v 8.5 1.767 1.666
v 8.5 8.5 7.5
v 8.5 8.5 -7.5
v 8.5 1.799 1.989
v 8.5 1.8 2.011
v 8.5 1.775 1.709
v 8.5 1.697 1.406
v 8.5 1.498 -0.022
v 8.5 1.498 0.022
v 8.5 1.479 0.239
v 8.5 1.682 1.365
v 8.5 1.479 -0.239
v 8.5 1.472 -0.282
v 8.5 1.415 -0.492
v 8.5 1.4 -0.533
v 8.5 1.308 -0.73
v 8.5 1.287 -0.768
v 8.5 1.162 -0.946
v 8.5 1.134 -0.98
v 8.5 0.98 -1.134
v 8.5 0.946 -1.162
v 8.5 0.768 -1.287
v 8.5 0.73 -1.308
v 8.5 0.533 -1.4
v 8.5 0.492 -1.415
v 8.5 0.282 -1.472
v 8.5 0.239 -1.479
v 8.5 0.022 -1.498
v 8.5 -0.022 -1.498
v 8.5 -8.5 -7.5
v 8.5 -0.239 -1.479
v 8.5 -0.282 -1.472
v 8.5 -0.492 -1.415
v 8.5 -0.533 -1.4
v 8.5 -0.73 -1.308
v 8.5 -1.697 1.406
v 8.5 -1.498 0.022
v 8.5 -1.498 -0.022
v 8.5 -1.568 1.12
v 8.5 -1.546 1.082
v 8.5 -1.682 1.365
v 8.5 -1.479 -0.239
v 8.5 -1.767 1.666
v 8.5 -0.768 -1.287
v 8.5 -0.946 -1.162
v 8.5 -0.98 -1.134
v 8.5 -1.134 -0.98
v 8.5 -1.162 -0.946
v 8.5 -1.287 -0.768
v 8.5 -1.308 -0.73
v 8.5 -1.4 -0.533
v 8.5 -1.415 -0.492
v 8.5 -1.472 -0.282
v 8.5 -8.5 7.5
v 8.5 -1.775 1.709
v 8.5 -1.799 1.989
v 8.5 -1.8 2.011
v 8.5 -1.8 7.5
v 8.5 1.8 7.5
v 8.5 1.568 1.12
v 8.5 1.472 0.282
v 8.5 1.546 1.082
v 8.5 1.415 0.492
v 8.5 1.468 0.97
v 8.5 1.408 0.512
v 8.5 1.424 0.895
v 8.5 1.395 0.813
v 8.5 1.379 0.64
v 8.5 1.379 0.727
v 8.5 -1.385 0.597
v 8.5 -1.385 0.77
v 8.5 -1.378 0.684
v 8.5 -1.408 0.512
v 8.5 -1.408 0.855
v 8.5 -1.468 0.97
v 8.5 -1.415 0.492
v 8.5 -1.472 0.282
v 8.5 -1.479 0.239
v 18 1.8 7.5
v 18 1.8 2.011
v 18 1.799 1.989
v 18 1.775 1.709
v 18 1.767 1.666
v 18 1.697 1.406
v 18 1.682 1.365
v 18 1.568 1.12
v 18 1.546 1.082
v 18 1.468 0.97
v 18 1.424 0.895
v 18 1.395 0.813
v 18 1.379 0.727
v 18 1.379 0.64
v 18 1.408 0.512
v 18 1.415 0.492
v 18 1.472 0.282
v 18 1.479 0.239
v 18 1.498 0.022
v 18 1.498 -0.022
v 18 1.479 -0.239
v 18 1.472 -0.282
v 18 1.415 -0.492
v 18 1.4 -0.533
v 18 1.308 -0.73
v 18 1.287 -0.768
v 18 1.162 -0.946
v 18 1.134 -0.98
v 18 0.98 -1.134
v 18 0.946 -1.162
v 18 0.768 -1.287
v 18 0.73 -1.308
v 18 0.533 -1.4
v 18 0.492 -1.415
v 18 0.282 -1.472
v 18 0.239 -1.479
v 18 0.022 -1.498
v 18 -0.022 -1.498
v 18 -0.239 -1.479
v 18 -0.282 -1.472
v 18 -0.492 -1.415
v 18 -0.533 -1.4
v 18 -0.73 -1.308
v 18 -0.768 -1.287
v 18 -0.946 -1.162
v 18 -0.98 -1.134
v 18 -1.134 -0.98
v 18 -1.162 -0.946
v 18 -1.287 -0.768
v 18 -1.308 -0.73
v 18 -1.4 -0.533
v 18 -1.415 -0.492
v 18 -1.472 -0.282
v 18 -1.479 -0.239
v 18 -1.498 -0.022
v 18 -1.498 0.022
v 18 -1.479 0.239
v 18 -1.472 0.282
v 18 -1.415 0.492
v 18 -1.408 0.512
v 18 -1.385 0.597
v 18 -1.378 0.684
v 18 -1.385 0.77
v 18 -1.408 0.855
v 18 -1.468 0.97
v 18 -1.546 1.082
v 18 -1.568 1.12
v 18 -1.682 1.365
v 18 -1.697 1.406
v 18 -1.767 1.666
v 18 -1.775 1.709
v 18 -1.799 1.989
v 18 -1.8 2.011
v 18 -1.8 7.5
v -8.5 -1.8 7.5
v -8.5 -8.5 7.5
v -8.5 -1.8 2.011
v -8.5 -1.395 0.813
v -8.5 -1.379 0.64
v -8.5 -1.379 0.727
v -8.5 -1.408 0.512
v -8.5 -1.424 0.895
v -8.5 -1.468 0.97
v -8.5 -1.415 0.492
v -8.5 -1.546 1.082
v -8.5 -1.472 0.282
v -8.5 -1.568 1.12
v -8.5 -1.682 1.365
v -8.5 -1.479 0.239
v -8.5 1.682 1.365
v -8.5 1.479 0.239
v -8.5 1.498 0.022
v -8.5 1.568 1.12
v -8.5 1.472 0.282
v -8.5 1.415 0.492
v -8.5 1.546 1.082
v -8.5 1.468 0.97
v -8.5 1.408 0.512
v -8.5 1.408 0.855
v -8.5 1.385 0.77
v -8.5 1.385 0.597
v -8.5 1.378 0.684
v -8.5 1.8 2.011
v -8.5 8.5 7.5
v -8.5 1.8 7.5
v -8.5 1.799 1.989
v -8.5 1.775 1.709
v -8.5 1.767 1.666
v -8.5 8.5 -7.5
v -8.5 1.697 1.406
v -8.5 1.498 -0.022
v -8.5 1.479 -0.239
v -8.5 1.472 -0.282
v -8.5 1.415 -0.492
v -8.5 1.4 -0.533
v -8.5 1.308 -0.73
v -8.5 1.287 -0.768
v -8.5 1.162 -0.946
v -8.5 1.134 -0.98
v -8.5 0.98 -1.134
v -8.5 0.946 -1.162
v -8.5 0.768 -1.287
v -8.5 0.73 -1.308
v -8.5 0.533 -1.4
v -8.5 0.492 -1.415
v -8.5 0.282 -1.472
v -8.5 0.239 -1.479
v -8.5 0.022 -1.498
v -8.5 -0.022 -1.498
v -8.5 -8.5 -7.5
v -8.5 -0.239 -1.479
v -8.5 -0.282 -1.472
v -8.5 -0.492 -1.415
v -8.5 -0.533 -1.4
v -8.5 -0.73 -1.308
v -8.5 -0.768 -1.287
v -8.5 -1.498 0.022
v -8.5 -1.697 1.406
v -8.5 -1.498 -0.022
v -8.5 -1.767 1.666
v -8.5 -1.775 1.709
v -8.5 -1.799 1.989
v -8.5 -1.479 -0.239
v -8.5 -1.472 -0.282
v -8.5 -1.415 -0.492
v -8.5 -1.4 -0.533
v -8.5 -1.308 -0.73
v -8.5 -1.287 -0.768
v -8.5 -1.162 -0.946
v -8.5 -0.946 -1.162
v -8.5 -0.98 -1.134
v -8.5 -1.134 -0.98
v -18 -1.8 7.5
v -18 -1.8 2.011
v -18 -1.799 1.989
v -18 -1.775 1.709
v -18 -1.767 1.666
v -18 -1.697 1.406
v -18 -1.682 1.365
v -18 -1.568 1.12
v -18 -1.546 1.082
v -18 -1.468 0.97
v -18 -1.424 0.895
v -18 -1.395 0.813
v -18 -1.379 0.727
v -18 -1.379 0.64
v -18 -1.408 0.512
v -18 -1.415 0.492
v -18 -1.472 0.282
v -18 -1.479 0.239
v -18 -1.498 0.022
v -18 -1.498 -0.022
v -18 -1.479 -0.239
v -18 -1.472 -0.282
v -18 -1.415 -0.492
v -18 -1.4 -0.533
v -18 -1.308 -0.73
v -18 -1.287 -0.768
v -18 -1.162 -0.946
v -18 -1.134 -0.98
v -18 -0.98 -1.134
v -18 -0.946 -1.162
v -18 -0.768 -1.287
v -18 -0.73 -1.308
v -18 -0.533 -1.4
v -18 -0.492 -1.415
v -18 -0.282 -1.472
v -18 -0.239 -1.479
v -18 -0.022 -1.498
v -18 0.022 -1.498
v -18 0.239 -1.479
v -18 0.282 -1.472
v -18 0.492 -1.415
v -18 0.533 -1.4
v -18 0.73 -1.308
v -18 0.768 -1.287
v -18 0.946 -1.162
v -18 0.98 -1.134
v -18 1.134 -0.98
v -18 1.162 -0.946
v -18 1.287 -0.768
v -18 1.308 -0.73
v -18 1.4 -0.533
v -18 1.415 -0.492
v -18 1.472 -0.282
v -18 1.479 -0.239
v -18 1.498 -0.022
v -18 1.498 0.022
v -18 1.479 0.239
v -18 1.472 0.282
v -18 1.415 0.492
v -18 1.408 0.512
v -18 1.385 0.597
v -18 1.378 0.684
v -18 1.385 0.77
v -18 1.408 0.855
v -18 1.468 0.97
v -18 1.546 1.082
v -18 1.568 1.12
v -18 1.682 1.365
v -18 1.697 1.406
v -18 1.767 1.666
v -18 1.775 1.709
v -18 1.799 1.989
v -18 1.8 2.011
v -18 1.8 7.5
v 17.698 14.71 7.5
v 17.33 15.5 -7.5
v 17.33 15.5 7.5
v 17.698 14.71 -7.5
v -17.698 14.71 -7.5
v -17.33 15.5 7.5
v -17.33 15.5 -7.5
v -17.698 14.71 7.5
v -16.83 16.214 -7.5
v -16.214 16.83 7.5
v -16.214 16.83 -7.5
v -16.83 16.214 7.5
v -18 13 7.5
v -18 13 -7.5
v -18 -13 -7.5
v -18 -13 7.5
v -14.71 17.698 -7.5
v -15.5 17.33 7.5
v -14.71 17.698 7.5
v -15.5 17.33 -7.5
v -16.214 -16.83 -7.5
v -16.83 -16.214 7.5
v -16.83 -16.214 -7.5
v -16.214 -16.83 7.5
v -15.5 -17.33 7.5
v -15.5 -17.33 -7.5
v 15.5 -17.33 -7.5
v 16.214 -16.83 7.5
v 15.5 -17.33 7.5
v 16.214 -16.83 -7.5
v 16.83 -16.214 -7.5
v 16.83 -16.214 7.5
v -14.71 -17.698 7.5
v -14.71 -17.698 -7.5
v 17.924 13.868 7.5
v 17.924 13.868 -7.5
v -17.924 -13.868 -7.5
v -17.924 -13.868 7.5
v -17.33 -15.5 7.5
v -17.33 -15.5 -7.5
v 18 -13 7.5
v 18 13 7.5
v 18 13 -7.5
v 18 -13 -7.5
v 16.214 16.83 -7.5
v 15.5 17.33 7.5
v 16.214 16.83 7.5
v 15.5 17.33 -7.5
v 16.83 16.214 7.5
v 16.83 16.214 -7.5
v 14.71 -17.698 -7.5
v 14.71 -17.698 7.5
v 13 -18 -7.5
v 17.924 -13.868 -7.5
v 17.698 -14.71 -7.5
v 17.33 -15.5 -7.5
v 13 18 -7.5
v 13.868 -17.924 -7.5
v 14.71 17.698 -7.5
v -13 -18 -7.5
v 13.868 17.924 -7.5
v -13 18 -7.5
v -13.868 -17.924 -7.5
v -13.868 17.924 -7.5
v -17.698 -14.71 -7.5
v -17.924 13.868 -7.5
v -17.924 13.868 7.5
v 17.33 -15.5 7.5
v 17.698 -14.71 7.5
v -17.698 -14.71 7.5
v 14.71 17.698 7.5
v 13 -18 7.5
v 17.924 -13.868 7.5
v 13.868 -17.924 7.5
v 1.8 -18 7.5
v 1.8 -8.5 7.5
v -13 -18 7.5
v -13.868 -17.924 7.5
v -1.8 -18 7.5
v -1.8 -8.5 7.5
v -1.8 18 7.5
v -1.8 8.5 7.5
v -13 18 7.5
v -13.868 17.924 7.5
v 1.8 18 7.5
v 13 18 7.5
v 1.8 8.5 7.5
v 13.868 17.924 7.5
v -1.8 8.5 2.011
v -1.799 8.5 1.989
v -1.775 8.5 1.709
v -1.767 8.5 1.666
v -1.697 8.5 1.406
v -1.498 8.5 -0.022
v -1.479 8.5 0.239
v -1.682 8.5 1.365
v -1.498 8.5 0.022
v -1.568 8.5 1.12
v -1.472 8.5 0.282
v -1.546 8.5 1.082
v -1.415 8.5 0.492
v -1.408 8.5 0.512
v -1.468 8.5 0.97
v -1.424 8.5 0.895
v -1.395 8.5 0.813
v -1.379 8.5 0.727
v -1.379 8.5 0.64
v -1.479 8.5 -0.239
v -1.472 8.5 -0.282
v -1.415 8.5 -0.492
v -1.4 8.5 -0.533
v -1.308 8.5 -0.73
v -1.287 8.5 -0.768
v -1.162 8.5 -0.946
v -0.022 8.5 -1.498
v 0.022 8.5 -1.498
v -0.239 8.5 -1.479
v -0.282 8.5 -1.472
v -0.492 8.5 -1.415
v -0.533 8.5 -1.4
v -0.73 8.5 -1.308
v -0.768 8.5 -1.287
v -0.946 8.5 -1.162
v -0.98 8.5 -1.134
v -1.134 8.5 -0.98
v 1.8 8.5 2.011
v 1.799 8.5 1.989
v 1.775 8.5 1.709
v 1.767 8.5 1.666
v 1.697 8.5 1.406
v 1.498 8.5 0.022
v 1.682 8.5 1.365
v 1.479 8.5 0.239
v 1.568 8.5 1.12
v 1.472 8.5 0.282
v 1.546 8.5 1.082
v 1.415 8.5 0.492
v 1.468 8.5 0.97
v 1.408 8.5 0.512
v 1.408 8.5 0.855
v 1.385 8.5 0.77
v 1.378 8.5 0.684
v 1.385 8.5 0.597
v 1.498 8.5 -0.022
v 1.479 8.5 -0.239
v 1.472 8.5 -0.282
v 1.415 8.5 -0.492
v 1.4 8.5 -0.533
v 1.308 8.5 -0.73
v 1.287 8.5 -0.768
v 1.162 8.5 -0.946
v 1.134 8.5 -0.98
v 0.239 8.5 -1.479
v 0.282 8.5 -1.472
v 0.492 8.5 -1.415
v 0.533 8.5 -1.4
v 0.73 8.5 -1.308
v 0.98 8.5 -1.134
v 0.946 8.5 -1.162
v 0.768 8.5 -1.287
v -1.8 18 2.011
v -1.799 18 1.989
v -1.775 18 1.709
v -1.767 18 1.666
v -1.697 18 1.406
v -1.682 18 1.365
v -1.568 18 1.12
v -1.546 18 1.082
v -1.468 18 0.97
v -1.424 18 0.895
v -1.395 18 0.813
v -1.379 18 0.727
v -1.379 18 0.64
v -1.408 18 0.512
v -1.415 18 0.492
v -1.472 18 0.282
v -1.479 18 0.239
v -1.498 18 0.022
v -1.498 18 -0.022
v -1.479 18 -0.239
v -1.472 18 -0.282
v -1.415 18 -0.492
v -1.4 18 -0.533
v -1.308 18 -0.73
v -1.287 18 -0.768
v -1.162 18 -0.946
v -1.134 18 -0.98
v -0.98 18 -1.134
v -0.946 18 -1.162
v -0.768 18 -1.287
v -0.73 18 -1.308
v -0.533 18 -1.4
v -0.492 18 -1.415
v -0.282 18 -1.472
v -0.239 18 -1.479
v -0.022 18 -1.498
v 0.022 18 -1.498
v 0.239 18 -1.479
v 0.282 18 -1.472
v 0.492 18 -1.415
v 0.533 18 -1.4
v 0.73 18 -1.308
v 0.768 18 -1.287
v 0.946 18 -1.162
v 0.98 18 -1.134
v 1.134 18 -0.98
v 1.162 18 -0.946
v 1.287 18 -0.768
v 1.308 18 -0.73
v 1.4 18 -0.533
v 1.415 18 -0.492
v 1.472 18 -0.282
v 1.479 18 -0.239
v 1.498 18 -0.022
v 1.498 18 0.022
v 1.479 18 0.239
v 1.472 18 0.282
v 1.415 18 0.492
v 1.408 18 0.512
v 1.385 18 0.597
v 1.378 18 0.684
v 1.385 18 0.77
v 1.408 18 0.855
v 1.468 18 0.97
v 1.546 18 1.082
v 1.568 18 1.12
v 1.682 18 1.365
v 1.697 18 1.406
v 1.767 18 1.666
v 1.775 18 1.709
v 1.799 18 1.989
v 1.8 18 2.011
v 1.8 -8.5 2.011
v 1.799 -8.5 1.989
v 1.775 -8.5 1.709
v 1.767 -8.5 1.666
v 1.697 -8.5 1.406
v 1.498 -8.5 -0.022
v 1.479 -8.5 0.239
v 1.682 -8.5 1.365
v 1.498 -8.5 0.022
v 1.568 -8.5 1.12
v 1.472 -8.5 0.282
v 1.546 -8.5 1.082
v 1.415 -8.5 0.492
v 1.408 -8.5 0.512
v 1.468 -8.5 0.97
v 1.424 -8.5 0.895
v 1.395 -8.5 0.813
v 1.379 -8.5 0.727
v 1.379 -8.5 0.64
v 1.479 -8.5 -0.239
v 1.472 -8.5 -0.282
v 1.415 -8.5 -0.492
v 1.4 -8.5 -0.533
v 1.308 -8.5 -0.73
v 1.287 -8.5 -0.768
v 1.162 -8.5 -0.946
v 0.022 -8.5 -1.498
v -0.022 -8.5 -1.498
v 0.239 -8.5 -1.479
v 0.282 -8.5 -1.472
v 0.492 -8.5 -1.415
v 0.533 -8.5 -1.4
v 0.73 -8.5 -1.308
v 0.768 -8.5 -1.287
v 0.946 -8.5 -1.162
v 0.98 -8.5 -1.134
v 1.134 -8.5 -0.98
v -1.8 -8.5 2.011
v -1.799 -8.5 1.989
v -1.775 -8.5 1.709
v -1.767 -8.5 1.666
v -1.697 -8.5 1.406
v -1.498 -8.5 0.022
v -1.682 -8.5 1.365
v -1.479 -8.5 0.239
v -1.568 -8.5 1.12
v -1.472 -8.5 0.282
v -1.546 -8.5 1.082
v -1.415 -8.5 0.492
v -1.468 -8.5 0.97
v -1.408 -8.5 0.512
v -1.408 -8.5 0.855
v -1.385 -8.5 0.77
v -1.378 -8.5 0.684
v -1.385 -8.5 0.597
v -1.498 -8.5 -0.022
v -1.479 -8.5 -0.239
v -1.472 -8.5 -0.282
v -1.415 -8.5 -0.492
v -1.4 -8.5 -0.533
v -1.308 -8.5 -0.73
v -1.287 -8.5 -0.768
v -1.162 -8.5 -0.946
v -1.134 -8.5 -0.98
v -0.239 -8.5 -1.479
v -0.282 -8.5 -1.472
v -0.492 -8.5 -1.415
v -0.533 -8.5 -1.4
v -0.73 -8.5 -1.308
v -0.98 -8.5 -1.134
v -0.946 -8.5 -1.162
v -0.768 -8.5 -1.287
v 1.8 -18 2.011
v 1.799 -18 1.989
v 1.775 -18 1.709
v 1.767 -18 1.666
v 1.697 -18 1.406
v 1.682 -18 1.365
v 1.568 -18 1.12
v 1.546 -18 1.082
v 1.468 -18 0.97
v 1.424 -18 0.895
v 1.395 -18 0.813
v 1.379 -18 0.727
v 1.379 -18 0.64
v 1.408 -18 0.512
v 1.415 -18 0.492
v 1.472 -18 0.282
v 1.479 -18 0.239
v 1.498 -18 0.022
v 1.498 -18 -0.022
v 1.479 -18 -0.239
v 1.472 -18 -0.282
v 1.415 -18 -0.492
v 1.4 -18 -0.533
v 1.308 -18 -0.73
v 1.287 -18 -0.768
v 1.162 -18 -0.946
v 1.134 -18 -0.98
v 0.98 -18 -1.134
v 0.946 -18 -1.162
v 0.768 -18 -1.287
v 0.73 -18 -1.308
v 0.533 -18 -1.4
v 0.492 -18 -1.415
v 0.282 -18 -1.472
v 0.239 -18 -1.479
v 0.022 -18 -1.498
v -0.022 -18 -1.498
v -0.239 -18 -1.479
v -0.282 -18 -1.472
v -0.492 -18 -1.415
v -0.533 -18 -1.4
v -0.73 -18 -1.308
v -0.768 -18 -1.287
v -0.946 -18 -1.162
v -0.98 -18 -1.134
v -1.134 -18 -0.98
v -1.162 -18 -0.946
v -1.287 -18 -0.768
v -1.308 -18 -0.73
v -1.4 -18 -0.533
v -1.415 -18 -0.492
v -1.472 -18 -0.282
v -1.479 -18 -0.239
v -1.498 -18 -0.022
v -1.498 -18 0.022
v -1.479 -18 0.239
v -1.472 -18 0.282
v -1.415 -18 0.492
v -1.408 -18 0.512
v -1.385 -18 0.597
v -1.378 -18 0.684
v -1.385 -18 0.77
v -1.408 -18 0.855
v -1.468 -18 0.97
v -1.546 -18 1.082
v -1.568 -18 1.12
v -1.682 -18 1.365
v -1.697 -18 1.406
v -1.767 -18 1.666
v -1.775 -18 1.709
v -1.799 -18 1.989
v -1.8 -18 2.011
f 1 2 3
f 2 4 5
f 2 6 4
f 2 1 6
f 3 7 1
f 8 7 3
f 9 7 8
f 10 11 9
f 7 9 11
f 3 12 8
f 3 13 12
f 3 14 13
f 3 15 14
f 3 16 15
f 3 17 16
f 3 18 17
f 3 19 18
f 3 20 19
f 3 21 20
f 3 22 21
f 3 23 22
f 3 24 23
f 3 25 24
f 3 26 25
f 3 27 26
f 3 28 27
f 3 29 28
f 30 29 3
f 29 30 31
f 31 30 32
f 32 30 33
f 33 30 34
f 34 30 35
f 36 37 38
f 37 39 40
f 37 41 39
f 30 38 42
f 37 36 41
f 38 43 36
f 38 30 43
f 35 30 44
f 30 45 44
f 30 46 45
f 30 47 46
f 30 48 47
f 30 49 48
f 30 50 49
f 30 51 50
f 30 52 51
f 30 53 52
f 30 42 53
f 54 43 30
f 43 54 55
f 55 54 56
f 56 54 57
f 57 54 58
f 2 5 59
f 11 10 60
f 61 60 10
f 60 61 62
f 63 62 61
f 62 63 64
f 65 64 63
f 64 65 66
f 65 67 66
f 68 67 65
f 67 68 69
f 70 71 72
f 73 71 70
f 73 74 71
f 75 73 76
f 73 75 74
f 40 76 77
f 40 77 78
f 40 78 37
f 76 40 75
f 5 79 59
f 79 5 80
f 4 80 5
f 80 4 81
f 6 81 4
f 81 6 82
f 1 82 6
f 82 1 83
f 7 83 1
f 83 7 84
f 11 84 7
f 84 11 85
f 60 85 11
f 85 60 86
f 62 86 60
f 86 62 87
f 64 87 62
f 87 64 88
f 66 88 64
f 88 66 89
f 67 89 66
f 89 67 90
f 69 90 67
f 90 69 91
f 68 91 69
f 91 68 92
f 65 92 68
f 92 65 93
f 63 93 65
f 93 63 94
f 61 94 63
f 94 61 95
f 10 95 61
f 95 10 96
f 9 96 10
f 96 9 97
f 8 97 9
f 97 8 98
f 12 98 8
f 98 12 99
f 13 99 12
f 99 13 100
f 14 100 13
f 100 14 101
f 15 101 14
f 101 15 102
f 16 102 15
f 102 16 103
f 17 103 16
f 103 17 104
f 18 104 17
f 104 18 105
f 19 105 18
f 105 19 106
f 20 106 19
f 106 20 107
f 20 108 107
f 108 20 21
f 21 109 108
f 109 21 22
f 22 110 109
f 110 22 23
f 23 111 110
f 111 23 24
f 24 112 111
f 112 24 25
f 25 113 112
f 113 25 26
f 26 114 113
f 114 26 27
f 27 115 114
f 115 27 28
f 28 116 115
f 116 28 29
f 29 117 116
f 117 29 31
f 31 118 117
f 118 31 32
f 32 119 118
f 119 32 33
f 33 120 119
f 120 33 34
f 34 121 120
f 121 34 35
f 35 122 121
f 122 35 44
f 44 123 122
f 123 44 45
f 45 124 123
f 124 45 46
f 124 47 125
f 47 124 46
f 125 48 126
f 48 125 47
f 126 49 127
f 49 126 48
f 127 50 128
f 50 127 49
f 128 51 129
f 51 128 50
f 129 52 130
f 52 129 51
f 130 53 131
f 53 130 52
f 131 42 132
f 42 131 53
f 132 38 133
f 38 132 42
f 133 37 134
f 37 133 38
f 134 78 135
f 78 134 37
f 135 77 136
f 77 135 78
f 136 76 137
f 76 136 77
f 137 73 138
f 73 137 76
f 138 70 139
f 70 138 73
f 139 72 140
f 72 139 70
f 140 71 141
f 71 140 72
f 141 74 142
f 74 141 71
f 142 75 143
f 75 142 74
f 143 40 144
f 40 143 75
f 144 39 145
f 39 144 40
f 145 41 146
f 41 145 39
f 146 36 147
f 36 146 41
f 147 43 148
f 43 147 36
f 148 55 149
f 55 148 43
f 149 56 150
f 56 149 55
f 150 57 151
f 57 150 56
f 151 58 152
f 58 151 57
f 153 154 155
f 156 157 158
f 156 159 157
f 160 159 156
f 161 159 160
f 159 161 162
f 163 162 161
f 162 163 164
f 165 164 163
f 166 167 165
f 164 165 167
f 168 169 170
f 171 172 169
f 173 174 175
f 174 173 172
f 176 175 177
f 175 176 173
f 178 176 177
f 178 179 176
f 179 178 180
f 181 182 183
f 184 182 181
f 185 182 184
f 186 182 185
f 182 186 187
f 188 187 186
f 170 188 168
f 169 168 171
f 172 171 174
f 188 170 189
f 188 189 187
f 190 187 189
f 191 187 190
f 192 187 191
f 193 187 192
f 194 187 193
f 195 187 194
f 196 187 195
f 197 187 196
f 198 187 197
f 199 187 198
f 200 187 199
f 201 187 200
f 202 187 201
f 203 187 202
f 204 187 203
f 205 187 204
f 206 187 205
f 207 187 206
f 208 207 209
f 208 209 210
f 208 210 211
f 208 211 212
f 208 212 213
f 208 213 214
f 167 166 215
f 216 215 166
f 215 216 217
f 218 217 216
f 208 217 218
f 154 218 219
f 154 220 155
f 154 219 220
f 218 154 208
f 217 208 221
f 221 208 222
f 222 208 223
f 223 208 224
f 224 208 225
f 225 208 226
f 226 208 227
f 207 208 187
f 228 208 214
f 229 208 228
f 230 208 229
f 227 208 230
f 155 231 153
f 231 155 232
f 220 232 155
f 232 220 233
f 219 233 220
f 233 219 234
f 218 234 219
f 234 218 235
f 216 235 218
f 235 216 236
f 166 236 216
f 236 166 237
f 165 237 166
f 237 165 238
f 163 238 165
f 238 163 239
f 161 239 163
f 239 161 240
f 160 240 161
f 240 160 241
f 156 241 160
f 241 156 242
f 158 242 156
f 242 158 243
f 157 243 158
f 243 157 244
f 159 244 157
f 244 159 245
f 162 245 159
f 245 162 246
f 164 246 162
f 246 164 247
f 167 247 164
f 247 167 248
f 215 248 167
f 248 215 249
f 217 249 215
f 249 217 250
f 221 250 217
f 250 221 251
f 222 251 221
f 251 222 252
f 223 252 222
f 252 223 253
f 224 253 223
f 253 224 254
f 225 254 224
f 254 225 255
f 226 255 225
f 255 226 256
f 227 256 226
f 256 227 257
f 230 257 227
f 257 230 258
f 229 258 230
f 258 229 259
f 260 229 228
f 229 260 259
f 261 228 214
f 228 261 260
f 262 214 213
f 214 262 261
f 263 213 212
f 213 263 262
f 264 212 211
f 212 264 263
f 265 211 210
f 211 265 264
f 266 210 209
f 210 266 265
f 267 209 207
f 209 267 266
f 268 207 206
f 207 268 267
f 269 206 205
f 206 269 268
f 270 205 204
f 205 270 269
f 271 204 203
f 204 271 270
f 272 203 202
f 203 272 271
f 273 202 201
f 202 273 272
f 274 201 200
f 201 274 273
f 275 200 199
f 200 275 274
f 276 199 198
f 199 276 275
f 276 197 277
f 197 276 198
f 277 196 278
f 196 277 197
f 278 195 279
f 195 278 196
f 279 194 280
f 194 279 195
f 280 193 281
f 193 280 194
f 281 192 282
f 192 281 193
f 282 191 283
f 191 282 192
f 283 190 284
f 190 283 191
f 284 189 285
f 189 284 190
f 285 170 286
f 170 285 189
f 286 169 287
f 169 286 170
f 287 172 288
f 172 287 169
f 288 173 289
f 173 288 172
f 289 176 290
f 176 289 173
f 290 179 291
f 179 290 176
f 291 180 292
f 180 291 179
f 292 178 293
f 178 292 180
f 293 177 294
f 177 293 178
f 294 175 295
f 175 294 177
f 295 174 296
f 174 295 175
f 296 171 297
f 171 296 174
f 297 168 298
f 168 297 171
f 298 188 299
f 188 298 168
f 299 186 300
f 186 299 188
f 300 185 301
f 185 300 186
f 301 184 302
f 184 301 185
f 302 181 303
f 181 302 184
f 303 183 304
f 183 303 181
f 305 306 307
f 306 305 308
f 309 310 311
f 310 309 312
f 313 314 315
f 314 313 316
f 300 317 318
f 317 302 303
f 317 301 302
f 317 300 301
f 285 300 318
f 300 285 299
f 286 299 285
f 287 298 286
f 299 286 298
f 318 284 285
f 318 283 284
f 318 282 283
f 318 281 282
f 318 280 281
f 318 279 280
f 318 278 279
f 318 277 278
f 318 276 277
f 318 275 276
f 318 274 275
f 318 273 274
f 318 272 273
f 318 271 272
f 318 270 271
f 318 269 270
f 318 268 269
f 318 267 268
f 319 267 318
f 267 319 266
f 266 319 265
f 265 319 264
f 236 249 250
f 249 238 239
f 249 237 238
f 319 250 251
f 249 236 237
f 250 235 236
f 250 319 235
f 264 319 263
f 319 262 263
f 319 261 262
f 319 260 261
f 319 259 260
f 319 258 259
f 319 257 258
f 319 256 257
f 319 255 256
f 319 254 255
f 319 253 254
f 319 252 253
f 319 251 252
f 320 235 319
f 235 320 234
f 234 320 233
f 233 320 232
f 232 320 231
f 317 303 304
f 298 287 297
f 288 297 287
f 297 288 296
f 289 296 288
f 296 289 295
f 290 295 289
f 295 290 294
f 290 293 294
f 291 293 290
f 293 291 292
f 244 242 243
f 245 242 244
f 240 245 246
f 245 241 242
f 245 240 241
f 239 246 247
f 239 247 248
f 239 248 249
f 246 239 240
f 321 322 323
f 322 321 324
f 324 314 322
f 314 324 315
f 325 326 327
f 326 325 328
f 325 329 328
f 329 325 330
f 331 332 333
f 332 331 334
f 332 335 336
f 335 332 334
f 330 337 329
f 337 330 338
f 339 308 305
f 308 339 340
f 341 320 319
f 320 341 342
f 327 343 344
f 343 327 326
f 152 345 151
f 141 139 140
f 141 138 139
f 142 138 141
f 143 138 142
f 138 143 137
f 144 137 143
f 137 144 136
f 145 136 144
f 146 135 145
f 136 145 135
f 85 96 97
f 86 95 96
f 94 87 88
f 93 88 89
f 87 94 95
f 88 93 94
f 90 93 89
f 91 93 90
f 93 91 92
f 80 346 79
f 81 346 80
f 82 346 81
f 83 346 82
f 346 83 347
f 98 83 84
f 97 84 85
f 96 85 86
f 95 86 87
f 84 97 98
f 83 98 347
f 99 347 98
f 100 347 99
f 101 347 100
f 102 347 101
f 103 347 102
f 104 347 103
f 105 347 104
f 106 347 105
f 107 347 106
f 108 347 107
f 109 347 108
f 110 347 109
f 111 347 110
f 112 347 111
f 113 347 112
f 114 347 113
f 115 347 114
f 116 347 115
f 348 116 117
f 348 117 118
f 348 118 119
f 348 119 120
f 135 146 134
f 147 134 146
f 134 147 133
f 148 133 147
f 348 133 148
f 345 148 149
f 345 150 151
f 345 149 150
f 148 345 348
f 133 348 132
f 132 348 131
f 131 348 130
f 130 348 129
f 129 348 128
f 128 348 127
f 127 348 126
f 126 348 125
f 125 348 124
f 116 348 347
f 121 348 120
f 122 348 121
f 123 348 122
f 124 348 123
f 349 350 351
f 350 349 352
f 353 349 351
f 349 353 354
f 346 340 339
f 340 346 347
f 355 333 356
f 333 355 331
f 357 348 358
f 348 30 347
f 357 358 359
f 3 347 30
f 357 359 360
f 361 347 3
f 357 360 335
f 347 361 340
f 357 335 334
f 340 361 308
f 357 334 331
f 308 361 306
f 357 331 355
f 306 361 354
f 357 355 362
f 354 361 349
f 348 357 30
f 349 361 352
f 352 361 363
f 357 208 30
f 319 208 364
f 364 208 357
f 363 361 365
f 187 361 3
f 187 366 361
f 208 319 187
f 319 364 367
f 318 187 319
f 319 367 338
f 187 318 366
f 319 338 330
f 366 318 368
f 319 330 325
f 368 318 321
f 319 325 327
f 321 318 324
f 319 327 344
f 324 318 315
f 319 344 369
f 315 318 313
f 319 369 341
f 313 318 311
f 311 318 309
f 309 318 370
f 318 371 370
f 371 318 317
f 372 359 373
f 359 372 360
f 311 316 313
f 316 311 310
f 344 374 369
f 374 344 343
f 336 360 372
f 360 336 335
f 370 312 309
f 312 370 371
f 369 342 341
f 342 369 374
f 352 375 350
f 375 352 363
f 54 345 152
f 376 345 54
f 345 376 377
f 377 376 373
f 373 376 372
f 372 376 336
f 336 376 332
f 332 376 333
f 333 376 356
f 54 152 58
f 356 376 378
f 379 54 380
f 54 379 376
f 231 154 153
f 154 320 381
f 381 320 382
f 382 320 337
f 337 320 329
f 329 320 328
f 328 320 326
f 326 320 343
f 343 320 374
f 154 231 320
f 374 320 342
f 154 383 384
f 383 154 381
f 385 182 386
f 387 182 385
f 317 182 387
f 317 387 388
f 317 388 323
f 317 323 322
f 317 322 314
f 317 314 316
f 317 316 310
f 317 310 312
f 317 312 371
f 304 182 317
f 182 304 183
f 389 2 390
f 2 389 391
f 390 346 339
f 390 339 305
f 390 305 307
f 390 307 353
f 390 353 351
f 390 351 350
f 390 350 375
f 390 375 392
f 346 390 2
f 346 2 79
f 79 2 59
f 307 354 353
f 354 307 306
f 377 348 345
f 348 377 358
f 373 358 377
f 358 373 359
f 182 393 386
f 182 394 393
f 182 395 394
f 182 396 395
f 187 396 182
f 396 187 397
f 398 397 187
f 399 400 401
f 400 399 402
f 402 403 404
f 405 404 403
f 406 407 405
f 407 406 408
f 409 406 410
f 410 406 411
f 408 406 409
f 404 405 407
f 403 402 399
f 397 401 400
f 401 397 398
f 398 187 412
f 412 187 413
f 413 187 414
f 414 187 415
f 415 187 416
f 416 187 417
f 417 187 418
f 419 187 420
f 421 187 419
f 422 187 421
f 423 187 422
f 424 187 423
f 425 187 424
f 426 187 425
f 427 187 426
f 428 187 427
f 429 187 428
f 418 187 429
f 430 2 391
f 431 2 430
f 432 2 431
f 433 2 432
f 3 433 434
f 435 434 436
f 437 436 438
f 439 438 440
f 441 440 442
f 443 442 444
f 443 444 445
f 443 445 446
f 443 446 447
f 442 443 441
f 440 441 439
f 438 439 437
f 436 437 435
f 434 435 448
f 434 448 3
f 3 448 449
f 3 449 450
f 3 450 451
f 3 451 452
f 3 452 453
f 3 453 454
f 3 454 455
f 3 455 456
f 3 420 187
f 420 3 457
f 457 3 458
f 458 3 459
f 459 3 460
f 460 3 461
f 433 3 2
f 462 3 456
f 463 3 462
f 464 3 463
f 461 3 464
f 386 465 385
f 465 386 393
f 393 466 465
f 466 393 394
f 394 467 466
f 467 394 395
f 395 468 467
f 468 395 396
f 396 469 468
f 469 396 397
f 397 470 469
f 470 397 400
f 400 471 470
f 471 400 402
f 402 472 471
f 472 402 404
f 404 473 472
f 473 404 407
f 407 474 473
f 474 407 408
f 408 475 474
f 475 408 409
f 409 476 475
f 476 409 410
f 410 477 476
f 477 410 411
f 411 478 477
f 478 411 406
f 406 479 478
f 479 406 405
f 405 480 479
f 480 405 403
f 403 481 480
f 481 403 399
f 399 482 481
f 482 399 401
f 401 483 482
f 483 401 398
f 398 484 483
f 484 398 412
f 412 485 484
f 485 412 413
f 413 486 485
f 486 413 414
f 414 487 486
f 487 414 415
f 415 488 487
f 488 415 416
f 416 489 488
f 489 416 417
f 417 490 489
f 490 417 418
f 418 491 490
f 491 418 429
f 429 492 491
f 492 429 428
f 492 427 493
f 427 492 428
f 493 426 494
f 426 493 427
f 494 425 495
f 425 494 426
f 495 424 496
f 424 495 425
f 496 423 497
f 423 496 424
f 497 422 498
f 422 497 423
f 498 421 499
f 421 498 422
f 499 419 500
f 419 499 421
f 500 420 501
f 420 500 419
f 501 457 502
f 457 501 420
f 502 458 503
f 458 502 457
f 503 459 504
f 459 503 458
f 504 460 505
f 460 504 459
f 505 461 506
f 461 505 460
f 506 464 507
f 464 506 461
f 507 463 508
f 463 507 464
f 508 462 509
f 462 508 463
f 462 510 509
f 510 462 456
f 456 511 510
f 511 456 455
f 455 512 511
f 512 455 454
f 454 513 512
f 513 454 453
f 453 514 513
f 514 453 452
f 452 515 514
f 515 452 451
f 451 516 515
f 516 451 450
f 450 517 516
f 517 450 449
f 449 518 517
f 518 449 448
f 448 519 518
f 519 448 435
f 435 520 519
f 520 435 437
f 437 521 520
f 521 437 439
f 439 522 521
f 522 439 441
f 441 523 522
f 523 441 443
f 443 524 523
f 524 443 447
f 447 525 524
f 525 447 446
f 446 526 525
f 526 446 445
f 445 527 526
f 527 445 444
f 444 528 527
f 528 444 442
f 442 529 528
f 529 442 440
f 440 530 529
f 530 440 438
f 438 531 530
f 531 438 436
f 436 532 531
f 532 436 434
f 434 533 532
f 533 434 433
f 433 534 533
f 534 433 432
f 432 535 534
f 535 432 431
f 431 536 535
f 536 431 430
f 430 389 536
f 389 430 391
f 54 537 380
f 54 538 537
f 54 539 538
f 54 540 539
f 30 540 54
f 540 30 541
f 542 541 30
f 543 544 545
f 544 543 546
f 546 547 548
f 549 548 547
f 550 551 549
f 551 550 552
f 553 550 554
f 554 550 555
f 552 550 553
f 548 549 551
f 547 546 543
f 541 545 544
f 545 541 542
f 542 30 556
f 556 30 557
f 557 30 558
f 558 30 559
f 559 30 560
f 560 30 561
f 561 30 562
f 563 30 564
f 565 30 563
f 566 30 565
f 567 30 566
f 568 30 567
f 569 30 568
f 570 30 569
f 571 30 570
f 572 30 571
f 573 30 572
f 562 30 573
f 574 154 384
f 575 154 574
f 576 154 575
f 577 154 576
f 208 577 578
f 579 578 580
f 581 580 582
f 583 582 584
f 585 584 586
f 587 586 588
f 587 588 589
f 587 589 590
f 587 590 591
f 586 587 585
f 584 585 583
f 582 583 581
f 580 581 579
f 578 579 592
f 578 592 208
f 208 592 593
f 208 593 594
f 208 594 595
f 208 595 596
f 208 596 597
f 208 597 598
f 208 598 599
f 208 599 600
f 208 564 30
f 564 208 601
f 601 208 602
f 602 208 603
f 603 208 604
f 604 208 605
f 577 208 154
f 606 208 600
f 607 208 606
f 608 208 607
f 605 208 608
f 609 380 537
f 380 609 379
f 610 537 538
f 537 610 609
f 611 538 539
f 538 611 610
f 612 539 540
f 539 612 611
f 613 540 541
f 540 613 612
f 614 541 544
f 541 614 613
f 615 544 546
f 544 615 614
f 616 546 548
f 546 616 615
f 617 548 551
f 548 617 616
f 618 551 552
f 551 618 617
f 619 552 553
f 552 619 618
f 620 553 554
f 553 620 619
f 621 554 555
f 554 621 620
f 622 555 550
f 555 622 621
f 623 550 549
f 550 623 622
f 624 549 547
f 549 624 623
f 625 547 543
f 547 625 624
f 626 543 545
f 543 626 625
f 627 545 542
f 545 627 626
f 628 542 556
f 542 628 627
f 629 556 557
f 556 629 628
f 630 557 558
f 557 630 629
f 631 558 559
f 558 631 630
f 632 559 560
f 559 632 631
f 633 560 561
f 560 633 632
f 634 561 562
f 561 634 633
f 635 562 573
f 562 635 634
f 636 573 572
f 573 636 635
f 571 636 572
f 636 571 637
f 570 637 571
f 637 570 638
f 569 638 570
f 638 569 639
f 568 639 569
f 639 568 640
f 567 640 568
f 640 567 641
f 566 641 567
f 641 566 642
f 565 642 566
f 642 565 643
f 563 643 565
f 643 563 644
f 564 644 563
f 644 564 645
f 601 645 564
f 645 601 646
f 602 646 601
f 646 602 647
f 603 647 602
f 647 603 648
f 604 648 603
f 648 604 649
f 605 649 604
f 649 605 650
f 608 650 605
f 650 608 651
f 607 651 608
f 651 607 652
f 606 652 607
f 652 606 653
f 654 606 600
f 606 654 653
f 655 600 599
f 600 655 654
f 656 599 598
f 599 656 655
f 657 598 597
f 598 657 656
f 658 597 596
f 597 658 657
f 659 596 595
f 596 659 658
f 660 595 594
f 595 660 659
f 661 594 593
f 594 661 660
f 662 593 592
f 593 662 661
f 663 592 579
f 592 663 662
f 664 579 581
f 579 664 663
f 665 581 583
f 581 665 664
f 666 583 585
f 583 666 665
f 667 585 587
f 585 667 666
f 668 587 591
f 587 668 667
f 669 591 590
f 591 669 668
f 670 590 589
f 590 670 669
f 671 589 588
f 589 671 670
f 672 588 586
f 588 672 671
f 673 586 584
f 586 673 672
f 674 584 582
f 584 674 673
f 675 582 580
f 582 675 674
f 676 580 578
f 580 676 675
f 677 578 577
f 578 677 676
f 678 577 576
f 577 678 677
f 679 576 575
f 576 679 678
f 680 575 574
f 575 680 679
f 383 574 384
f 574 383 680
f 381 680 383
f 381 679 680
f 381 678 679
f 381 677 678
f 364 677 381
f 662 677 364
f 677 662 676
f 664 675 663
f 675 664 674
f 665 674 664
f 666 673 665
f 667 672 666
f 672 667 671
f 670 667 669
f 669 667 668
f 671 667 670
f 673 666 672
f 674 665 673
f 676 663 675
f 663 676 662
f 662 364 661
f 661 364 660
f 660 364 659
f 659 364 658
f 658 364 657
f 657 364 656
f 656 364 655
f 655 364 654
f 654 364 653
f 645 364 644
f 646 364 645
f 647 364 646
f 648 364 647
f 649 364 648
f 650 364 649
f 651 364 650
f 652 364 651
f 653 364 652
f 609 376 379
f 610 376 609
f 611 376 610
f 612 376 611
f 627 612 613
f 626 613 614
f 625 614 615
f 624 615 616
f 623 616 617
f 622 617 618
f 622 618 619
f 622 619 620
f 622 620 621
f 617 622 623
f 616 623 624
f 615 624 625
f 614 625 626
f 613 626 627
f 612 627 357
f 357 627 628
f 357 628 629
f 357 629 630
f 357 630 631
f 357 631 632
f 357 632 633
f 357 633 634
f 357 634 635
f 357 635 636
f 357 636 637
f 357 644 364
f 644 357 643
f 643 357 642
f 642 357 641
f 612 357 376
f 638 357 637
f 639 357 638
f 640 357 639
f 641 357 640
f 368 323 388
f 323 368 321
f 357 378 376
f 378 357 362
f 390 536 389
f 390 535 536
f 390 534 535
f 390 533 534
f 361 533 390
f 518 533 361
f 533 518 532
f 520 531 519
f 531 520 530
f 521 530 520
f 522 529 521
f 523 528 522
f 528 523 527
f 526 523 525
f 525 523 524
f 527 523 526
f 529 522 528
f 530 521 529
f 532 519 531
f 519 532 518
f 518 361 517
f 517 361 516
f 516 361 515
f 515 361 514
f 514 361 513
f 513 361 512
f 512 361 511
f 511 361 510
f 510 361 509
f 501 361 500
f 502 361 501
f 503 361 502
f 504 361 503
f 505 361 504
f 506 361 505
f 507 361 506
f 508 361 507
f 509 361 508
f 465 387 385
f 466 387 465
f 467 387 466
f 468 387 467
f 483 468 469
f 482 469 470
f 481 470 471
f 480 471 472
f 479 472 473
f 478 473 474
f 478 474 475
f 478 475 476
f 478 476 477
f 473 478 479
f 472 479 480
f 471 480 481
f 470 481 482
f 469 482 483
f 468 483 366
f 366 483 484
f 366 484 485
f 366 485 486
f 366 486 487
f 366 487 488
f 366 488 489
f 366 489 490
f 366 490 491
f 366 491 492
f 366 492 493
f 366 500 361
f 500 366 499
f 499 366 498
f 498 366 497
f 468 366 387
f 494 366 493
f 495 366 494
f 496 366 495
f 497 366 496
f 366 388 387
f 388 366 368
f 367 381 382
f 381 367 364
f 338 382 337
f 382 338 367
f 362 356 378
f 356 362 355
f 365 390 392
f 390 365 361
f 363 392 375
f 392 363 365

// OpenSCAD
   $fn=36;  
   

union(){
translate([0,0,0])cage();
translate([0,0,0]) rotate([0,0,90])cage();
}
//   minidiff();
//rotate([90,0,0])cuff();
//rotate([90,0,0])cage();

//translate([0,0,00])rotate([90,0,0])gear1();

module cage()
{$fn=36;
    
    
    intersection(){union(){
rotate([0,0,90])translate([0,-8.5,0])rotate([90,0,0])  cagebar();
rotate([0,0,-90])translate([0,-8.5,0])rotate([90,0,0])  cagebar();
    }
        o=5;
    linear_extrude(15,center=true)     offset(o)offset(-o) square(36,center=true);
    }
        
        
        
    }
    module cagebar(){
        
        
            o=.5;
  linear_extrude(10,convexity=100) offset(o)offset(-o) difference(){
    square([35,18],center=true);
    circle(1.5);
      hull(){
  translate([0,2,0])  circle(1.8);
  translate([0,16.5,0])  circle(1.8);
      }
        }}
 module minidiff(){
o=4.7;
rotate([-90,  0,0])translate([0,0,-o])gear2();
rotate([90,  0,0])translate([0,0,-o])gear2();
rotate([0, 90,0])translate([0,0,-o])gear2();
rotate([0,-90,0])translate([0,0,-o])gear2();
}

module gear2(){
    
    translate([0,0,-1.60])
    union(){
            $fn=36;
    difference(){
        
 
        mirror([0,0,1])cylinder(3.25,4.5,4.5,center=true );
 
 
        
         cylinder(8,1.6,1.6,center=true);
        }
   import("22.stl");}
 
}
module cuff(){
     
    $fn=36;
    difference(){
        
 union(){
        mirror([0,0,1])cylinder(3,4.5,4.5,center=true );
 
     rotate([0,90,0])cylinder(24,1.5,1.5,center=true);
     }
        
         cylinder(8,1.6,1.6,center=true);
        }
    
    
    }
    
    
    
    module gear1(){
        $convexity=100;
      difference()
    {   linear_extrude(5,center=true,convexity=100 )   projection() scale(1.25)import("1.stl");
                    o=.5;
     
     linear_extrude(26,center=true,convexity=100)     offset(o)offset(-o) square(17,center=true);
        gearinset();
    }
    
    }
        module gear3(){
        $convexity=100;
      linear_extrude(5,center=true,convexity=100 )  difference()
    {    projection() scale(1.25)import("1.stl");
    circle(1.7);
    }
    
    }
    
module    gearinset(){

   $fn=36;
            o=-.5;
  rotate([90,0,90])linear_extrude(25,center=true,convexity=100) offset(o, $fn=16)offset(-o, $fn=36) union(){
     circle(1.5);
  translate([0,2,0])  circle(1.8);
        
        }}
